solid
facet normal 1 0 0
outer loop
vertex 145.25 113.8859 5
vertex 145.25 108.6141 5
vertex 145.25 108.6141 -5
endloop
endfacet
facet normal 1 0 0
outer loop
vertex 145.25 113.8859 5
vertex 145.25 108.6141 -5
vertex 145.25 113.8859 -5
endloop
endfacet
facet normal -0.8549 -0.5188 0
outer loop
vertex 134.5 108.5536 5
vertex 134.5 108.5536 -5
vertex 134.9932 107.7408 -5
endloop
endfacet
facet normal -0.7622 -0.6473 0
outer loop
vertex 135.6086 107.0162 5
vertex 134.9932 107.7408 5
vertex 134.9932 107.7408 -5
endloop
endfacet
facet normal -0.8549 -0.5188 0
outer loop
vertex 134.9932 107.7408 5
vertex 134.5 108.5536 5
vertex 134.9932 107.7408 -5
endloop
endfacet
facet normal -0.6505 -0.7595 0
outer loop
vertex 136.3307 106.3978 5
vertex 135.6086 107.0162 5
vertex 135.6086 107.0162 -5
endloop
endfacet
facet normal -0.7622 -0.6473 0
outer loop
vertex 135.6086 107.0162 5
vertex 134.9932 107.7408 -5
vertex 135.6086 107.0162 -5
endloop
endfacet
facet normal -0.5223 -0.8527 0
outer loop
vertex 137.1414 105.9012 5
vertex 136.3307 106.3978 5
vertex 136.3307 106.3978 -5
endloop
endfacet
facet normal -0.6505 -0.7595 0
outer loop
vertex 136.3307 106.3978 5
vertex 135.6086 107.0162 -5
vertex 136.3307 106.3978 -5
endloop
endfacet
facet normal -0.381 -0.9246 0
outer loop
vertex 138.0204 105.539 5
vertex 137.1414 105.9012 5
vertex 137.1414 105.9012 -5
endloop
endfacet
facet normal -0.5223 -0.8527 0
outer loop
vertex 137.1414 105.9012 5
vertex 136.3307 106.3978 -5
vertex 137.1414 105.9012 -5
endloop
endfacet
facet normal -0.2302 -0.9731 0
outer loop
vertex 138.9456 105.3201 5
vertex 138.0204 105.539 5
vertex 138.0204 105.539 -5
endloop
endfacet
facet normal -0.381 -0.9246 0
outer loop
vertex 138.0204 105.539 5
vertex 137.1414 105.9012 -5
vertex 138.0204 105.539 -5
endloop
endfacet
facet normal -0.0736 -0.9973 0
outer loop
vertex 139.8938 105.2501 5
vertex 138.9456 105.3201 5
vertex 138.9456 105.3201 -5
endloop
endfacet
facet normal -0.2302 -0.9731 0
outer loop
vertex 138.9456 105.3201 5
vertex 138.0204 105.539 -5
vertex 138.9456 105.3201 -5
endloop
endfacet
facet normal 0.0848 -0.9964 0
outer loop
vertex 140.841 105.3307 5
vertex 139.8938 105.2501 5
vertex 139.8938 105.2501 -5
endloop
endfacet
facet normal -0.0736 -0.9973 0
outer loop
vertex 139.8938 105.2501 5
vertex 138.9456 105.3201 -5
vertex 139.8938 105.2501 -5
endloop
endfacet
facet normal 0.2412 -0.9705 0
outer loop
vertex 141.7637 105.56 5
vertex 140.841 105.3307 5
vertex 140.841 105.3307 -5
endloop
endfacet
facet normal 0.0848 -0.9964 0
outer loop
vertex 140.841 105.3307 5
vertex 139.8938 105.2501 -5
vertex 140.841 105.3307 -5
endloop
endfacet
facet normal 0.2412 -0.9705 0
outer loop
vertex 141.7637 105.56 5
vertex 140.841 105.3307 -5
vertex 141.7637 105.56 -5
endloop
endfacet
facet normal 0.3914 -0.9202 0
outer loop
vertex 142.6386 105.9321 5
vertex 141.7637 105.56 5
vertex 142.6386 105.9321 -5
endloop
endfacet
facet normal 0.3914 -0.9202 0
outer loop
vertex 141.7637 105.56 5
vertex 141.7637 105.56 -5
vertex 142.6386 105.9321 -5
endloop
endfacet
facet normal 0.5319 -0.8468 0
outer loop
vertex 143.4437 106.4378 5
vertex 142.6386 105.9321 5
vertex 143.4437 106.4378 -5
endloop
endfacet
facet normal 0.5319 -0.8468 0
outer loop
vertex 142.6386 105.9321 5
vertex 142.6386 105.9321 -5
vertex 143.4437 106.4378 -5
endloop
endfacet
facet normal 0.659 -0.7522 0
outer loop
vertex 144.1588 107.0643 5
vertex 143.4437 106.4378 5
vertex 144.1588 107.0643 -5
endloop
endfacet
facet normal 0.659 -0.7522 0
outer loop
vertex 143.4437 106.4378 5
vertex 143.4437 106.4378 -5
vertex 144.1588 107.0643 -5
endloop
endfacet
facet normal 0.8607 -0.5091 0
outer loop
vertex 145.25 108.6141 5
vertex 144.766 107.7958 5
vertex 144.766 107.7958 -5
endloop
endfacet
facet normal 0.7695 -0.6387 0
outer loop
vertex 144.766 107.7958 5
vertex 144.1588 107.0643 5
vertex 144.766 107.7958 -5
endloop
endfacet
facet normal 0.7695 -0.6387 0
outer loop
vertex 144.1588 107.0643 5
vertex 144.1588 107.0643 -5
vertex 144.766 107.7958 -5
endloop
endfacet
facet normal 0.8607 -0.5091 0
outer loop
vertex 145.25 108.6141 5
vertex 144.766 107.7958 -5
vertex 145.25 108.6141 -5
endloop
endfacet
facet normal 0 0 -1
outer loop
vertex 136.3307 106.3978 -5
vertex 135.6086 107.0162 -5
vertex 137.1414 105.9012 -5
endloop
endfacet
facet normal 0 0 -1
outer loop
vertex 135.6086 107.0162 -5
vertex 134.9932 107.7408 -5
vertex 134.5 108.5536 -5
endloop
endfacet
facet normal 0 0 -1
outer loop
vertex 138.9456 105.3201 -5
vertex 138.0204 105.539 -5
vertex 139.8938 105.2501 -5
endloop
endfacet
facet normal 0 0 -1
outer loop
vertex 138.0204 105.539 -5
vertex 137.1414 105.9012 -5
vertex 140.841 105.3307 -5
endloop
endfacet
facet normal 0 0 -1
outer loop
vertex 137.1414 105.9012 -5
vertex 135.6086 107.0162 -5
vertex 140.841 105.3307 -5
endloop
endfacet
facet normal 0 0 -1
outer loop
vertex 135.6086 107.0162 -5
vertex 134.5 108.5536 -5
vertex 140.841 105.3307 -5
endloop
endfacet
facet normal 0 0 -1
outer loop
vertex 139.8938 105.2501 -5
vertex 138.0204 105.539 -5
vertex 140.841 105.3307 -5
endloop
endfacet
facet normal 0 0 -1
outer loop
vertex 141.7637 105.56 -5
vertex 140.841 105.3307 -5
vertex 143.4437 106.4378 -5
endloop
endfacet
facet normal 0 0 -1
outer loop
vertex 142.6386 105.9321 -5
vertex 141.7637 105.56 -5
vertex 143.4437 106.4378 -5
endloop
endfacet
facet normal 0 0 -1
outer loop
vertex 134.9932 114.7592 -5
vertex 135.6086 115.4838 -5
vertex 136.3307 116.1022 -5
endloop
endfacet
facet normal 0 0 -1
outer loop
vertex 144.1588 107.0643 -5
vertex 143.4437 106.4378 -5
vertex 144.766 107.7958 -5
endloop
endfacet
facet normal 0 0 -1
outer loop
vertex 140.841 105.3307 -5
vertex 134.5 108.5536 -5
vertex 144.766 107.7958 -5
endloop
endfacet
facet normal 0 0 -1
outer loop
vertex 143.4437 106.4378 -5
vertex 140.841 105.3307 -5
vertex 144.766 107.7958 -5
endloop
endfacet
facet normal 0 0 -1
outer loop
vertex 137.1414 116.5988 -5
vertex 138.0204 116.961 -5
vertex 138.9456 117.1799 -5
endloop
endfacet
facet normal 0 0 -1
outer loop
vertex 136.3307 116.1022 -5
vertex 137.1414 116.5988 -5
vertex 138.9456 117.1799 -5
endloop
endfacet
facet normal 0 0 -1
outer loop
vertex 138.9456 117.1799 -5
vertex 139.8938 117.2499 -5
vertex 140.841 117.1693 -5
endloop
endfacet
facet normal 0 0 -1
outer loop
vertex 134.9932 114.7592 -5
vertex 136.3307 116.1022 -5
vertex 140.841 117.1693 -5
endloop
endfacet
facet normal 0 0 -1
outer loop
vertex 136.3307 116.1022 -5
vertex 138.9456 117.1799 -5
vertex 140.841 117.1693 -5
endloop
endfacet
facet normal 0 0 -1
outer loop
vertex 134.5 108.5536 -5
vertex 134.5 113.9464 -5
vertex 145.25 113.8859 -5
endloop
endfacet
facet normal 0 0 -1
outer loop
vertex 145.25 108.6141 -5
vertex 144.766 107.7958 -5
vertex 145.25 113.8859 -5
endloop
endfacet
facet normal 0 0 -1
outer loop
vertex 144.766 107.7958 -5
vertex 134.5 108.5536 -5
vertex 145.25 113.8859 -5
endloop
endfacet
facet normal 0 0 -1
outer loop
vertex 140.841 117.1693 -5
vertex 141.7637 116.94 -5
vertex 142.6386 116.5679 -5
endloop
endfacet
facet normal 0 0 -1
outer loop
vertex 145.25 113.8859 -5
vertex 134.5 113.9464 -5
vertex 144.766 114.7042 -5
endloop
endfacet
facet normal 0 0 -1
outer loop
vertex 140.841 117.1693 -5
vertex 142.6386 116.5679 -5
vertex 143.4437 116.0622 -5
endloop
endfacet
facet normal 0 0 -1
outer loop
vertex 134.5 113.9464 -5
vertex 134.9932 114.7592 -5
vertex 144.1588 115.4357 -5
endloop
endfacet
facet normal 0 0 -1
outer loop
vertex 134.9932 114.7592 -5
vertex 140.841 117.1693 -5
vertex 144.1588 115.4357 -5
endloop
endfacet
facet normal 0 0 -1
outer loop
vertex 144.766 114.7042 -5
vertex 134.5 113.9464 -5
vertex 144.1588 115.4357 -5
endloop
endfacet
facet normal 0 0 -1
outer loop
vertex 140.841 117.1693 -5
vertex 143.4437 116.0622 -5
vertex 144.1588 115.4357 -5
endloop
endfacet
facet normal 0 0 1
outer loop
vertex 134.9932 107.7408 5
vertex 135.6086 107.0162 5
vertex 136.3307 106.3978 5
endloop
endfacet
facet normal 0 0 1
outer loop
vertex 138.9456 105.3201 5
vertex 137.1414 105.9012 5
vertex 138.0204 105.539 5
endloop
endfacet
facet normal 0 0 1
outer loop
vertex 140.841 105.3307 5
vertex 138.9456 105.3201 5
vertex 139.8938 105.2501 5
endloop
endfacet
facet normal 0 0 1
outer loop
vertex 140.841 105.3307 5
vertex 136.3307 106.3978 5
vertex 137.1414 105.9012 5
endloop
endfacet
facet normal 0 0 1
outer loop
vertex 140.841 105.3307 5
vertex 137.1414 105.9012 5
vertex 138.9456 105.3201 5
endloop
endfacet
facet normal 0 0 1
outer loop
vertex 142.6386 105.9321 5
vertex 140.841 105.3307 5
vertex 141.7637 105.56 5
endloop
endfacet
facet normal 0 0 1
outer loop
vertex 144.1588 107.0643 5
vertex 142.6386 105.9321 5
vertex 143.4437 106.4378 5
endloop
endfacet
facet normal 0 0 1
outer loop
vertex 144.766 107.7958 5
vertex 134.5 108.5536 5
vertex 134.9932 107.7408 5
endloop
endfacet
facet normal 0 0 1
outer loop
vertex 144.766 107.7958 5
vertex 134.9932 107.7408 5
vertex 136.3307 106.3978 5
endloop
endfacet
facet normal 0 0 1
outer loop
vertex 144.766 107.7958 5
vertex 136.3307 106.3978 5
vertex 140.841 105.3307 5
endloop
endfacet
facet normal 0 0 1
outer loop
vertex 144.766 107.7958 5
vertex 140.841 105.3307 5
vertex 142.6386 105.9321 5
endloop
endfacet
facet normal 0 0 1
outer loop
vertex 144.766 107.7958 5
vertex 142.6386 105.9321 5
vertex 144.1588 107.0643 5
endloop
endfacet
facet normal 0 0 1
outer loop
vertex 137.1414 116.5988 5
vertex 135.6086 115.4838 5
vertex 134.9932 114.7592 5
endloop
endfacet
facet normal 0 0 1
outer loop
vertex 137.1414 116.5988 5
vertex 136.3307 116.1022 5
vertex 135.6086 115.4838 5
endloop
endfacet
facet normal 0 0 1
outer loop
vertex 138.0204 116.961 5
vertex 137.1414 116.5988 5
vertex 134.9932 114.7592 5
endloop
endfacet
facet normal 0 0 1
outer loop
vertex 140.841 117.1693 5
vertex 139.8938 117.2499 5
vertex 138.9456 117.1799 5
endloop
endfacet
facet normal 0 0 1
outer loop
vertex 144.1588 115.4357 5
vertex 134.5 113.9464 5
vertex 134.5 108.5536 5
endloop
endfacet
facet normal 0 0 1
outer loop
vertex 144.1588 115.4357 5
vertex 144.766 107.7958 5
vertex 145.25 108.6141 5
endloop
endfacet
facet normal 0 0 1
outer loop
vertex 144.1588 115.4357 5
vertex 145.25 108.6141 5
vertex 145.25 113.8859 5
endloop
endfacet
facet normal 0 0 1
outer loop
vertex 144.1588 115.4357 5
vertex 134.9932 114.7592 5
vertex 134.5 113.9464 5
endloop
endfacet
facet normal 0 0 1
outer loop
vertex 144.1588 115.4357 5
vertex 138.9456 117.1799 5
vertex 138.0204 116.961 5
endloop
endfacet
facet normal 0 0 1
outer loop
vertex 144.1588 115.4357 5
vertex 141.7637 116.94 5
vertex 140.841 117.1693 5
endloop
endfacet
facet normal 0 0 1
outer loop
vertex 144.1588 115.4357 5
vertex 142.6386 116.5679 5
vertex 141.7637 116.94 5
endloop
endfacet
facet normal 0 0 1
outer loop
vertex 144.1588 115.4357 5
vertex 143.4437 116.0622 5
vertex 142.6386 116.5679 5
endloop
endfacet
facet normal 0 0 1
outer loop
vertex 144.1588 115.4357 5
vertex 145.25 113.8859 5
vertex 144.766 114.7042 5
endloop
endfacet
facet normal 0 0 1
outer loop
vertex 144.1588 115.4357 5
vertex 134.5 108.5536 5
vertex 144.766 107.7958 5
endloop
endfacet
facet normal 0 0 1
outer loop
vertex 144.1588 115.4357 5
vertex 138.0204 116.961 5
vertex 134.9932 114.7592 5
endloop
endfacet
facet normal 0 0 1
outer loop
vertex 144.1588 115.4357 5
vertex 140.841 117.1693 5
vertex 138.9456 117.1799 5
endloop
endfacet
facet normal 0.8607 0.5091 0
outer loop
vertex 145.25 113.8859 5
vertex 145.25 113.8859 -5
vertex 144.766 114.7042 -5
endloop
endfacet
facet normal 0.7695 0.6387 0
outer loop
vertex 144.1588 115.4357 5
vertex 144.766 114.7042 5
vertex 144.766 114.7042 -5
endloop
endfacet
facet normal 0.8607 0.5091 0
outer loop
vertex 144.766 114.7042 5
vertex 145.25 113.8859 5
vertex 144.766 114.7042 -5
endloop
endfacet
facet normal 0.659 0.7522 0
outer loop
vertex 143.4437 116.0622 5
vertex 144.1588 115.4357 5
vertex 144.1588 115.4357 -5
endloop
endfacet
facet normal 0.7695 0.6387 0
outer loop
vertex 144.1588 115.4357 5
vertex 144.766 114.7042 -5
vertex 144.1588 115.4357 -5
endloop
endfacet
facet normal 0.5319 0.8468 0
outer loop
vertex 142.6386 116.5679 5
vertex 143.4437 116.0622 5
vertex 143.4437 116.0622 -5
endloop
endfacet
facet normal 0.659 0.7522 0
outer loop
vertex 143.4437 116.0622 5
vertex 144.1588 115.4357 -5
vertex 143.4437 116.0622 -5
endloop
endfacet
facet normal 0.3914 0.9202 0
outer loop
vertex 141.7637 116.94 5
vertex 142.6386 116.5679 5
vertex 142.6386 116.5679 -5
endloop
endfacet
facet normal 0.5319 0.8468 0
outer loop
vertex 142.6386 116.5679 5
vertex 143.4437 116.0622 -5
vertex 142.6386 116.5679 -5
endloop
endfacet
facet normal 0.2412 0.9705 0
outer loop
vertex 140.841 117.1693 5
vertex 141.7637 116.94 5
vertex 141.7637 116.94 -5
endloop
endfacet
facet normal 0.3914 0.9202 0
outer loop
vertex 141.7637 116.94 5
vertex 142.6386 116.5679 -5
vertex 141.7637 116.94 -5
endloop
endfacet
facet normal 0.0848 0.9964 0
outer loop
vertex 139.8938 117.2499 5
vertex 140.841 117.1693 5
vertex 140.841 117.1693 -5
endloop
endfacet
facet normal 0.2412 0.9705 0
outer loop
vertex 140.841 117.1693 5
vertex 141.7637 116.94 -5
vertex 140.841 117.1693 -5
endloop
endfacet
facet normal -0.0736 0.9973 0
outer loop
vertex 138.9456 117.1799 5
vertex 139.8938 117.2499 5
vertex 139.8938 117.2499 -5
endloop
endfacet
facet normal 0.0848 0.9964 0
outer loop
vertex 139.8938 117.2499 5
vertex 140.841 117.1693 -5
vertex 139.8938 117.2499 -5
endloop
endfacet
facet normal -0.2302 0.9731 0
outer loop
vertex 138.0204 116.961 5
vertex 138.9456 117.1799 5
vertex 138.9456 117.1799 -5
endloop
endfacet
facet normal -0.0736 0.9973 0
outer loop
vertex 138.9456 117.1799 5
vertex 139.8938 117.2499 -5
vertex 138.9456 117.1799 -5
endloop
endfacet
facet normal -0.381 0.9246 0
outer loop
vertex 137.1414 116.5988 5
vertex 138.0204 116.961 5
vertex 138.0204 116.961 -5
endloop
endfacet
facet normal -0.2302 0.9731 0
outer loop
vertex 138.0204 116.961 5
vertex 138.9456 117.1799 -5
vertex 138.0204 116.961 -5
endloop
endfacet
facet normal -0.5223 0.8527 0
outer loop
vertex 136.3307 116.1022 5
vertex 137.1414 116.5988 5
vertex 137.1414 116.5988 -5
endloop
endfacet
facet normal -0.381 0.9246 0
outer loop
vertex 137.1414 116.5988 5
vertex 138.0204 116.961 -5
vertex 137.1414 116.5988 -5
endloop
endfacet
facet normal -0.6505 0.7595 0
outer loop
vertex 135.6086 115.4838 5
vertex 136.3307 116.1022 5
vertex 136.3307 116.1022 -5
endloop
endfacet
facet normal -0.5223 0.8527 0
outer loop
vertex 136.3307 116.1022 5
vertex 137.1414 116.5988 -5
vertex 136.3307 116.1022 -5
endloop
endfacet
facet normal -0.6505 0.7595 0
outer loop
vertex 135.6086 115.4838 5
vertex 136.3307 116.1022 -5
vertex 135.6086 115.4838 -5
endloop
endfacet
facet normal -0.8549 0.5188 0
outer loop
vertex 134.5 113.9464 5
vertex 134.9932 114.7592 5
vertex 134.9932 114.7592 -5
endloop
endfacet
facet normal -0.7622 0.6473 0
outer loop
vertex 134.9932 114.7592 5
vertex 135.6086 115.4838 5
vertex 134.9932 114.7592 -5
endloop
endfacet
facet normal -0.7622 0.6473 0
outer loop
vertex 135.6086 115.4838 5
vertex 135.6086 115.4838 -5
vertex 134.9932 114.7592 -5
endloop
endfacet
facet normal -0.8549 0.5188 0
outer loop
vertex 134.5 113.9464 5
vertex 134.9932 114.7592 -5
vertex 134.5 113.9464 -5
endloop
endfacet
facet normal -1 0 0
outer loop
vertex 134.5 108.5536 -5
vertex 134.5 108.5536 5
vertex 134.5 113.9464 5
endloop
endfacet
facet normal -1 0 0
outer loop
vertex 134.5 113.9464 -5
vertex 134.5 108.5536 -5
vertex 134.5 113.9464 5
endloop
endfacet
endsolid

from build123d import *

# Parameters (mm, degrees)
BOX058_W          = 2
BOX058_H          = 12
BOX058_DEPTH      = 10
BOX059_W          = 2
BOX059_H          = 12
BOX059_DEPTH      = 10
CYLINDER061_R     = 6
CYLINDER061_DEPTH = 10


with BuildPart() as cube057:
    # Box058 → Box058 (new body)
    with BuildSketch(Plane(origin=(145.25, 105.25, -5), x_dir=(1, 0, 0), z_dir=(0, 0, 1))):
        with Locations((1, 6)):
            Rectangle(BOX058_W, BOX058_H)
    extrude(amount=BOX058_DEPTH)


with BuildPart() as cube058:
    # Box059 → Box059 (new body)
    with BuildSketch(Plane(origin=(132.5, 105.25, -5), x_dir=(1, 0, 0), z_dir=(0, 0, 1))):
        with Locations((1, 6)):
            Rectangle(BOX059_W, BOX059_H)
    extrude(amount=BOX059_DEPTH)


with BuildPart() as keyhole:
    # Cylinder061 → Cylinder061 (new body)
    with BuildSketch(Plane(origin=(139.86, 111.25, -5), x_dir=(1, 0, 0), z_dir=(0, 0, 1))):
        Circle(CYLINDER061_R)
    extrude(amount=CYLINDER061_DEPTH)

    # Cut072: cut Cube058
    add(cube058.part, mode=Mode.SUBTRACT)

    # Cut073: cut Cube057
    add(cube057.part, mode=Mode.SUBTRACT)


solid = keyhole.part
